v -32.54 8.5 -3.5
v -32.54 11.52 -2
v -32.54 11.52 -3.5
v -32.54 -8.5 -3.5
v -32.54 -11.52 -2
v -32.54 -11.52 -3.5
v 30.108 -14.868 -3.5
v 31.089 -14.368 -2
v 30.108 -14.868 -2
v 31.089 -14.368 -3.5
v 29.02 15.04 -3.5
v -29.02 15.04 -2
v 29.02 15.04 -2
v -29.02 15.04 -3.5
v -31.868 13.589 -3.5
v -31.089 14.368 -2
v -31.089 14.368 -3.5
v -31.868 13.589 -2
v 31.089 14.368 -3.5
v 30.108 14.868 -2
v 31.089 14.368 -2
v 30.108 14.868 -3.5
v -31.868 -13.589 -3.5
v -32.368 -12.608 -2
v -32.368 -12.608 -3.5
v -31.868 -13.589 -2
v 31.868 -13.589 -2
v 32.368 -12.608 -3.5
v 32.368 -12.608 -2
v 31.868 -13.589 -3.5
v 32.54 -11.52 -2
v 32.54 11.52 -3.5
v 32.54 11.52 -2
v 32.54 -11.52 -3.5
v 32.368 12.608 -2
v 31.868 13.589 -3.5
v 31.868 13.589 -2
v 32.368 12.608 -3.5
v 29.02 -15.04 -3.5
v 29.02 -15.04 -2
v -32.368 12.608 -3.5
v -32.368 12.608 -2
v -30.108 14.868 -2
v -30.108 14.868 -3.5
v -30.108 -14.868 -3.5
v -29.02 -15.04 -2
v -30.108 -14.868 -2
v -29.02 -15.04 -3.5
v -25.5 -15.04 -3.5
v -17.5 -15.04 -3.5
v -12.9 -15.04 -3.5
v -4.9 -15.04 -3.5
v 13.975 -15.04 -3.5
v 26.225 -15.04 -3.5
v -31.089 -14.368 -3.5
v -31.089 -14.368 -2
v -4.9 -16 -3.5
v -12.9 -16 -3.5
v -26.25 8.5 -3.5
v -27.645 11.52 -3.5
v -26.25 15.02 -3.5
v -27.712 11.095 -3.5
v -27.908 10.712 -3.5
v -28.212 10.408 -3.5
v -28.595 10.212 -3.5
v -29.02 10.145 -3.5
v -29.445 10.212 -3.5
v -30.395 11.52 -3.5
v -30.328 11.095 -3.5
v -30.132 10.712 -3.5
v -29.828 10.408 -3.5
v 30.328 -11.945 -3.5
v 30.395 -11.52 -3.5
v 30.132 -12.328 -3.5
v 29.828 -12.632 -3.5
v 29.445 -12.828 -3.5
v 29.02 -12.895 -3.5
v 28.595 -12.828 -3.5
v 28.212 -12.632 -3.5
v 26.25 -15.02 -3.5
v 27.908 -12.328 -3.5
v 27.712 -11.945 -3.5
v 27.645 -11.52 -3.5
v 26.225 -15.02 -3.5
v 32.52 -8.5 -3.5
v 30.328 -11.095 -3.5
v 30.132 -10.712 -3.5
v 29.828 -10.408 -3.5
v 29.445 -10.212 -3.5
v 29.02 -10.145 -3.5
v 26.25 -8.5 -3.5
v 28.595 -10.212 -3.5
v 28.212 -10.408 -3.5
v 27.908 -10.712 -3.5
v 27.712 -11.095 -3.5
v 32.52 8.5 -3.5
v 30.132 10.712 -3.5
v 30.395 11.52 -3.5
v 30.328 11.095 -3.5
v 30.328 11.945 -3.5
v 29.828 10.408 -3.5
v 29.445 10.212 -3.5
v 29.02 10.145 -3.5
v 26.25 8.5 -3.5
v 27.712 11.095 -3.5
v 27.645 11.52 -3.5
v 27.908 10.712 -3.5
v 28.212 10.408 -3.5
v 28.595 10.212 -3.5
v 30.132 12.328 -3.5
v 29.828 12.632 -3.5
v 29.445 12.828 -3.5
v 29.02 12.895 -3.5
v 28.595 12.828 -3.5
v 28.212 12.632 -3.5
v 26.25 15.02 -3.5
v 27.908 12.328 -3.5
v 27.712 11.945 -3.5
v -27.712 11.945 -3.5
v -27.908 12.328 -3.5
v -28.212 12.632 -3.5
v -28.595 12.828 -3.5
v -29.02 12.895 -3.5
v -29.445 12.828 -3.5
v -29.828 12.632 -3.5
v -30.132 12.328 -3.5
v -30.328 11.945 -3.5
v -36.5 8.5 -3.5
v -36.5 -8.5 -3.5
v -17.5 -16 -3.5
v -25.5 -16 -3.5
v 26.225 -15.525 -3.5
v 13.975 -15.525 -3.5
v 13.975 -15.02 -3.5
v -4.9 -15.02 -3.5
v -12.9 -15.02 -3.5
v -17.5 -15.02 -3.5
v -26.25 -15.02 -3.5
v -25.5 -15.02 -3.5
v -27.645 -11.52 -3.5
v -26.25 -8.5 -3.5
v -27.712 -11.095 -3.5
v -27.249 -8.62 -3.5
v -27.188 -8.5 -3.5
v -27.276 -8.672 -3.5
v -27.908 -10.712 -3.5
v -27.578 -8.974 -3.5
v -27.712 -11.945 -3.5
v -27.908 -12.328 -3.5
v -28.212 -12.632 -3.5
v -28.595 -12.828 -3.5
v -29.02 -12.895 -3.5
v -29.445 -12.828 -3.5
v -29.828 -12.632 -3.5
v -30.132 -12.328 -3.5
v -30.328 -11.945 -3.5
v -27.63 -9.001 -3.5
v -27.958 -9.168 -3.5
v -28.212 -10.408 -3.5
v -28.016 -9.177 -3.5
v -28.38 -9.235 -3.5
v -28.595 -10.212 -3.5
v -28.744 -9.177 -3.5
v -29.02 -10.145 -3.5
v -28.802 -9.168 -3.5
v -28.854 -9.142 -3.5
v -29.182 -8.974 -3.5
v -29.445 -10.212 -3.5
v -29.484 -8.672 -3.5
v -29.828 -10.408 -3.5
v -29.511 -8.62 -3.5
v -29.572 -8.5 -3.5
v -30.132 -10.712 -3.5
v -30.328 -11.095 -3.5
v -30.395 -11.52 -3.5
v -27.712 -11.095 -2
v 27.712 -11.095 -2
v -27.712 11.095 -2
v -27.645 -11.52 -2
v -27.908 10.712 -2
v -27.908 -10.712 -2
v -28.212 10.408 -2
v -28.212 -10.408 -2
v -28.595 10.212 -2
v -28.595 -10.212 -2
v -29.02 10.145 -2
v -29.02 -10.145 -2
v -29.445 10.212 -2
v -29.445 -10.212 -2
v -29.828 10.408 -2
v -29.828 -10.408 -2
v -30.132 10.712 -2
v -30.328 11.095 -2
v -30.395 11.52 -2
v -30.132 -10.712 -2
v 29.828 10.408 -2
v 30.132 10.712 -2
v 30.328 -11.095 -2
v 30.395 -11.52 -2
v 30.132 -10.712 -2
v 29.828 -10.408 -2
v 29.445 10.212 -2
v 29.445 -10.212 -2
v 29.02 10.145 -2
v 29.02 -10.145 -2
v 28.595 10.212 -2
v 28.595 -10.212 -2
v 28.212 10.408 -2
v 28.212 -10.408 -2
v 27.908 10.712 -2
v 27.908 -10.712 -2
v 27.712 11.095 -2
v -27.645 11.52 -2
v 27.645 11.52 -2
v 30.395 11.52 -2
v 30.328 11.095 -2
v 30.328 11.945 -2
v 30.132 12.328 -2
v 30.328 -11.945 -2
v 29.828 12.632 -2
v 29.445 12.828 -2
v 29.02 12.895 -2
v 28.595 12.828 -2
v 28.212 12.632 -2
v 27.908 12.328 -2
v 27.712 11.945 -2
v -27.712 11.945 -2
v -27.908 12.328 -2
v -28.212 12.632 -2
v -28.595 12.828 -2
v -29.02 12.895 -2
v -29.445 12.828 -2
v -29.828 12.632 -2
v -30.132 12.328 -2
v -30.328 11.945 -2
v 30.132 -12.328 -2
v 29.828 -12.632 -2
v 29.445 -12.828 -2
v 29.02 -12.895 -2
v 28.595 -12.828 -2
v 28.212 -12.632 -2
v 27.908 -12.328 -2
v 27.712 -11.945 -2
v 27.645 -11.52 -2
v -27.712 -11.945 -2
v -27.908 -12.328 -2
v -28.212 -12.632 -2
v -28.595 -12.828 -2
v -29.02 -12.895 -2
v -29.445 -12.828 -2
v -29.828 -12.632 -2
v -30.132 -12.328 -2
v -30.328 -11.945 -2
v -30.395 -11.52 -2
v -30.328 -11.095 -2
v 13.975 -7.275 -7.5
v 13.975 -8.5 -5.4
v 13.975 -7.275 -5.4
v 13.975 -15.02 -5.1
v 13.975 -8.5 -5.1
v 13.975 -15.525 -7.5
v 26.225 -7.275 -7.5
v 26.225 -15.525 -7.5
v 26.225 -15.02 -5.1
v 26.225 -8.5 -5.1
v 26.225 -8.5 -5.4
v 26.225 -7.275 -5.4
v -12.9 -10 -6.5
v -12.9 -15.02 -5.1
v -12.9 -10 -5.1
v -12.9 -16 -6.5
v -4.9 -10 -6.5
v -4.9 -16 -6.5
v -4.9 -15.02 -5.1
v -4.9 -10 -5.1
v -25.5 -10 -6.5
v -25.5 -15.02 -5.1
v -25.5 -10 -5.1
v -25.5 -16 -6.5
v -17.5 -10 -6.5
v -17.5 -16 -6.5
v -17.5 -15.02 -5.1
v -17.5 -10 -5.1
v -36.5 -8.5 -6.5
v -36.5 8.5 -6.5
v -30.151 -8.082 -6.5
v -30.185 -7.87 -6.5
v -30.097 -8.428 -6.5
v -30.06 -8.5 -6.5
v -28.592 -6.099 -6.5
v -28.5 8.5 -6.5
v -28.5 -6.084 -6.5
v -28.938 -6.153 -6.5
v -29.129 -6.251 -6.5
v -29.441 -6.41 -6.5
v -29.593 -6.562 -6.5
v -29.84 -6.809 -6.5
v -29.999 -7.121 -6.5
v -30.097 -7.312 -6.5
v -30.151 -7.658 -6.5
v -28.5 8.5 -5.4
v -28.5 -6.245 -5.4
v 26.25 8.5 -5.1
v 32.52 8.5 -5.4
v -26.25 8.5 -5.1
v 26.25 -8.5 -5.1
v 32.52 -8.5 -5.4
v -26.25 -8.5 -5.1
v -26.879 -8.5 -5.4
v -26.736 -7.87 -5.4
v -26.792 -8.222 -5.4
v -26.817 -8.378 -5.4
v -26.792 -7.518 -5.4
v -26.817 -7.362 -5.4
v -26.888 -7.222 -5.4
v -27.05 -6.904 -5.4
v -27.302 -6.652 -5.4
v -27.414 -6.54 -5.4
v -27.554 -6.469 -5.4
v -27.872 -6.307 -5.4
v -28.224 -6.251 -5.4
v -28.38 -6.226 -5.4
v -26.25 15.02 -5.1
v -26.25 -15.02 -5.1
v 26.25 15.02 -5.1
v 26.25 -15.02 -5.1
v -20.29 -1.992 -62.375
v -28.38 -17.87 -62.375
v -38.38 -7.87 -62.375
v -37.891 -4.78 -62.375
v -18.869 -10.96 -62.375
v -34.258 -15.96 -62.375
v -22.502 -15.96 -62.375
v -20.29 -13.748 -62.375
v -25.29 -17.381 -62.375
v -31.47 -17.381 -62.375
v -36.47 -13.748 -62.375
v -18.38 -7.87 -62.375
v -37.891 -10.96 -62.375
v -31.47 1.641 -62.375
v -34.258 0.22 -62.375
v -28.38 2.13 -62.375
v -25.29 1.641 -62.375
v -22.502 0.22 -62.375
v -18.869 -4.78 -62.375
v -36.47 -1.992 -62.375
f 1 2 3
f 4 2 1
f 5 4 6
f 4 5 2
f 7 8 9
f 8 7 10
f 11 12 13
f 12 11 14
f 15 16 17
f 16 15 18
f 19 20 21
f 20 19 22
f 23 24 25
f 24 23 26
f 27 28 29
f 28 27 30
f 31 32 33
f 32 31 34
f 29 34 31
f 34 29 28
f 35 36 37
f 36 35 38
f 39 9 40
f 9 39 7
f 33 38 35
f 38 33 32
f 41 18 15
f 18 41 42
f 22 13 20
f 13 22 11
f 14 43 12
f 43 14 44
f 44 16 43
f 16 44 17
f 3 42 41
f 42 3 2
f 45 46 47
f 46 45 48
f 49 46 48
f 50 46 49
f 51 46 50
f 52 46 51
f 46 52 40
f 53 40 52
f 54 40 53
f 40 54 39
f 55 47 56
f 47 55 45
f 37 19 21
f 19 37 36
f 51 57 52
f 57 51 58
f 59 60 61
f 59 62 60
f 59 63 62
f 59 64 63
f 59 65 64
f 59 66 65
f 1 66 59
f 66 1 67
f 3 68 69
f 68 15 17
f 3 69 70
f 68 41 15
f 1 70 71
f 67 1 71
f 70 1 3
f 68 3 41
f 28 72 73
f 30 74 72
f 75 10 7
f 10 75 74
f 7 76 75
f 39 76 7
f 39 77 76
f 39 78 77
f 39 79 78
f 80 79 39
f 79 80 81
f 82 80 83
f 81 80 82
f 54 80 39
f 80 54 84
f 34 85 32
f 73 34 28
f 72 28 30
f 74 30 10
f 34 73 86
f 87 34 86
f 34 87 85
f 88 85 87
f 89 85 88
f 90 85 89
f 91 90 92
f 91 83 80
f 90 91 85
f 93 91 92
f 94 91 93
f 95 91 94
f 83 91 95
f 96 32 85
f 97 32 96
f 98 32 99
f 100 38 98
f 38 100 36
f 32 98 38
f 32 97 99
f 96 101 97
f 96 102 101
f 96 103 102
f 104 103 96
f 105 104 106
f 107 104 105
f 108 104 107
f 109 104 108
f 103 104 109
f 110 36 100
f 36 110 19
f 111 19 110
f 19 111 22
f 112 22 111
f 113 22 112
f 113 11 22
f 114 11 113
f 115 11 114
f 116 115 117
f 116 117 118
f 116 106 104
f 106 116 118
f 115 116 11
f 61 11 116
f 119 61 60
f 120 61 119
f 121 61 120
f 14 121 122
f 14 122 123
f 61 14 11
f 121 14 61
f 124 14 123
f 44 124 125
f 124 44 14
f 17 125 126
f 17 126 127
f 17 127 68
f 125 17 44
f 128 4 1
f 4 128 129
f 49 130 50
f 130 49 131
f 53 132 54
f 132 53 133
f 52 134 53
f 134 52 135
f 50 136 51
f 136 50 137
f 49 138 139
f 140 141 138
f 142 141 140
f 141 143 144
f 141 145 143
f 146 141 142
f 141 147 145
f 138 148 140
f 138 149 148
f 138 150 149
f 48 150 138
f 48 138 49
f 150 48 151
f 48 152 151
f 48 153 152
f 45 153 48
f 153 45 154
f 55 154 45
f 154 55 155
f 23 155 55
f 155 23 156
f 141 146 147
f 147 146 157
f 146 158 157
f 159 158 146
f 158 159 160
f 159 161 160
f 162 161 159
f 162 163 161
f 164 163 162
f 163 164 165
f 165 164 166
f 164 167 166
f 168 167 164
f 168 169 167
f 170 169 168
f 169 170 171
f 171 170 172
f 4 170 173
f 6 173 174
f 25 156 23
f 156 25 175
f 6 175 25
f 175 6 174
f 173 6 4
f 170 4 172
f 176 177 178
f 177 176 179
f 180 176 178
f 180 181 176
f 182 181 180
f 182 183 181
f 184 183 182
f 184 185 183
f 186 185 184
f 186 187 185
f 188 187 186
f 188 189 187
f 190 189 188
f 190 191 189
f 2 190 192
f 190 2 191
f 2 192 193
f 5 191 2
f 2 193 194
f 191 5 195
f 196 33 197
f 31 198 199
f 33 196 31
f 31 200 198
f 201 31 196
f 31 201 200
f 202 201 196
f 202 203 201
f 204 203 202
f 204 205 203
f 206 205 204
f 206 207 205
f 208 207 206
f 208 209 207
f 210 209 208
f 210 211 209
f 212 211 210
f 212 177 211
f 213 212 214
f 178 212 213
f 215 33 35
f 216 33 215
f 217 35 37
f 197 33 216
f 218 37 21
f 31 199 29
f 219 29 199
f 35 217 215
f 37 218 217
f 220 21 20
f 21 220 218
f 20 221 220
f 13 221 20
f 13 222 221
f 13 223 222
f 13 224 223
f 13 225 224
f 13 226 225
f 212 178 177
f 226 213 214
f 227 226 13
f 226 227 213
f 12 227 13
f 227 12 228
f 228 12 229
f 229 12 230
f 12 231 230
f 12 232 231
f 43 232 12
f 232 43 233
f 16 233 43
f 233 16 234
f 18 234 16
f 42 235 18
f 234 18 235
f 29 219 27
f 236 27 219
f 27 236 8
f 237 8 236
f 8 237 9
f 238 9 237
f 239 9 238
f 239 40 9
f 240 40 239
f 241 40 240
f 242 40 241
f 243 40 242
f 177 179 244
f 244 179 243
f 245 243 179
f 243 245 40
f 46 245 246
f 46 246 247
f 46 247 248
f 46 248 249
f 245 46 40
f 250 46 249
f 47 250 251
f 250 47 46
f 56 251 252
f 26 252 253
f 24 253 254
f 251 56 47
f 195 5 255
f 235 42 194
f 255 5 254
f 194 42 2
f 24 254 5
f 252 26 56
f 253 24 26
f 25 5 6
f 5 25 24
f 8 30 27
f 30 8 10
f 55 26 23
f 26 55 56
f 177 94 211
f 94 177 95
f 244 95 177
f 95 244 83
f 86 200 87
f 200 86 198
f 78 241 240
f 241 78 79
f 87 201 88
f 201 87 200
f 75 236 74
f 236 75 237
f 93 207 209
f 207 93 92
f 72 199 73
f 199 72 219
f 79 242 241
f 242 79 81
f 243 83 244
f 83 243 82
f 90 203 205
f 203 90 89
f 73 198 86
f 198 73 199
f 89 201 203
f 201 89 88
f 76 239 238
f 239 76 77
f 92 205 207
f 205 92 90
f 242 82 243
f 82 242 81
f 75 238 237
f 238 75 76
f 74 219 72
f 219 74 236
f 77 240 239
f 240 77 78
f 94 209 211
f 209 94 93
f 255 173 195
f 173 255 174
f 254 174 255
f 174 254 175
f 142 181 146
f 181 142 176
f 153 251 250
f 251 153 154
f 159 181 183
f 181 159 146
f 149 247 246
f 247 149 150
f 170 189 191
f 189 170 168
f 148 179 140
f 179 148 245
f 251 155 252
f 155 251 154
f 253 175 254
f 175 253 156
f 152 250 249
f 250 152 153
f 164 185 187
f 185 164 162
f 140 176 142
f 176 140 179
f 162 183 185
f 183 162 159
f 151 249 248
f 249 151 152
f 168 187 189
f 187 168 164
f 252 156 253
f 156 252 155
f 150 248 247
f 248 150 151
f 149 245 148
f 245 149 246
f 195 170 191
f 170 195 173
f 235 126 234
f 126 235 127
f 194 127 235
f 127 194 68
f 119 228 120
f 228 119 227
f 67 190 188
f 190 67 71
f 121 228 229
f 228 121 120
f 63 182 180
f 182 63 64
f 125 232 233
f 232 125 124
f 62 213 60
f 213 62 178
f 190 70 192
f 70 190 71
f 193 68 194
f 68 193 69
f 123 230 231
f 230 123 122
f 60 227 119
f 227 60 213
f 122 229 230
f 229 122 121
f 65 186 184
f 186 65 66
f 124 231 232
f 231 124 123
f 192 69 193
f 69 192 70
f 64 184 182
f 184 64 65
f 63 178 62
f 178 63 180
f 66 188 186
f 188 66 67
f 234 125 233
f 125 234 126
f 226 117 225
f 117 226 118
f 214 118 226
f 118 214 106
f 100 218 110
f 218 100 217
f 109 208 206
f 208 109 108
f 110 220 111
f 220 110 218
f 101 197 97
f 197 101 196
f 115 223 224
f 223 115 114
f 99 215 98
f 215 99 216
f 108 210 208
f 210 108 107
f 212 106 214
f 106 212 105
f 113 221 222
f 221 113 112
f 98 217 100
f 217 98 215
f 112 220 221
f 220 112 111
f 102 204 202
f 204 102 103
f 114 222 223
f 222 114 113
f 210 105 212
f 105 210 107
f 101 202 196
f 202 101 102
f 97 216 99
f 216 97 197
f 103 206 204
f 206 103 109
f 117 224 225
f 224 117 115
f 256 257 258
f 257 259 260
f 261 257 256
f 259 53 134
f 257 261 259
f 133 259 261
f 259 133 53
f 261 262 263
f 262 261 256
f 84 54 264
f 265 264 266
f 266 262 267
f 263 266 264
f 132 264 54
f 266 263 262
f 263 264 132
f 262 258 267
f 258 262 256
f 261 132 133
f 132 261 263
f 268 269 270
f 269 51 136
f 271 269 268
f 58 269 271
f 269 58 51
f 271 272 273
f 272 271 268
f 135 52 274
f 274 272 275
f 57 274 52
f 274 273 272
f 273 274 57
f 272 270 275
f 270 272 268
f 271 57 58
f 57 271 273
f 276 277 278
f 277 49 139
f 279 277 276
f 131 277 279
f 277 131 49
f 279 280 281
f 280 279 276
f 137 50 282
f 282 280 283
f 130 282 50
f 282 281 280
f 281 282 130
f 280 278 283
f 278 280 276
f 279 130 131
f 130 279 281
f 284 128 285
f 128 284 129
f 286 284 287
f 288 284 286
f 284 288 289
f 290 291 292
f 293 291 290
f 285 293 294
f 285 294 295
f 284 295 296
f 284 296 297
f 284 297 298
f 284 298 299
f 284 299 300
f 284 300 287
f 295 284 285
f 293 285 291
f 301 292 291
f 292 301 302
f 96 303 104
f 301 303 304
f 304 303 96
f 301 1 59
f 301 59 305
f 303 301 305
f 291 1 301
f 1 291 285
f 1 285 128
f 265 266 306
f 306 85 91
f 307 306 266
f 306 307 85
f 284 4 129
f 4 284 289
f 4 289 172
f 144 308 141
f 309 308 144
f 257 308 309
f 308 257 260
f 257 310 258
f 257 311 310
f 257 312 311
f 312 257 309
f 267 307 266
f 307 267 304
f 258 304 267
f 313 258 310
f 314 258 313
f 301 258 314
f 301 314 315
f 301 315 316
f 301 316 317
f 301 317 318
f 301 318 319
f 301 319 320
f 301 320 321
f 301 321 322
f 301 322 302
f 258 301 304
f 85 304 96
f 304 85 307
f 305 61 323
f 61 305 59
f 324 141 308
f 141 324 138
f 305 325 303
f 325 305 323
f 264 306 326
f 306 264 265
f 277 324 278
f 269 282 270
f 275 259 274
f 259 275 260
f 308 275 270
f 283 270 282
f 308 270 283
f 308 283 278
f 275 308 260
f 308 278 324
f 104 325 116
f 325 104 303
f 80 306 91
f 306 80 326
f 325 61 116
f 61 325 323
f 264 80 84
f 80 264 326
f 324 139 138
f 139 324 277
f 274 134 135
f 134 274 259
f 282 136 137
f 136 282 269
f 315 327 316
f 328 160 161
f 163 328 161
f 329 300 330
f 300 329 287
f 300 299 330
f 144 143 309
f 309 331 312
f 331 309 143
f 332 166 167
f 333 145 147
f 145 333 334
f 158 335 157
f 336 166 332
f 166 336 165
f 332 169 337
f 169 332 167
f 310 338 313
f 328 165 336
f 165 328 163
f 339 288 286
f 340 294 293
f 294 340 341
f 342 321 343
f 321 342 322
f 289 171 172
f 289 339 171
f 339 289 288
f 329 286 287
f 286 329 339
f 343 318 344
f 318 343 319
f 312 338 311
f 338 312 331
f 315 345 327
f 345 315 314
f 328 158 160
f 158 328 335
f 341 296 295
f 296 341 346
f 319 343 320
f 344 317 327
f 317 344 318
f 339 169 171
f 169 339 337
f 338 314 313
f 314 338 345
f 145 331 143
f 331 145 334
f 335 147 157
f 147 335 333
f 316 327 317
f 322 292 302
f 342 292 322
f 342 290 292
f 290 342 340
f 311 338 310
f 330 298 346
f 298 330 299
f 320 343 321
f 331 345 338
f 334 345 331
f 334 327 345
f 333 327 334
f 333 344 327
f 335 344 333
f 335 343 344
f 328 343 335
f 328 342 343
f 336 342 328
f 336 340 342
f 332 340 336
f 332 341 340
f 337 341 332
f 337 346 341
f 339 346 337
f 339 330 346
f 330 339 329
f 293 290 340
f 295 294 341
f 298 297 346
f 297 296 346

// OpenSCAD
//  Pi Zero model for checking other models
//  0,0,0 is centre of PCB, bottom face
//  This model is for V1.2

// PCB size variables
PiSizeX = 65.04;
PiSizeY = 30.04;
PiSizeZ = 1.5;
PiCornerRad = 3.52;
PiHoleEdge = 3.5;       // Mount holes are 3.5mm from each edge
PiHoleDia = 2.75;
PiHoleRad = PiHoleDia / 2;
PiHoleClearRad = 3.0;    // Mount holes have 6 Dia clear on PCB

//  Component connector centrelines from Pi centreline
PiSDX = -24.5;          // SD holder
PiSDY = 1.9;
PiUSBX = 8.9;           // Data (USB)
PiUSBY = -13;
PiOTGX = 21.5;          // Power (OTG)
PiOTGY = -13;
PiHDMIX = -20.1;        // HDMI
PiHDMIY = -11.4;
PiLEDX = 28.38;         // LED
PiLEDY = -7.87;
PiCAMX = 32.5;   //Camera connector
PiCAMY = 0;


//  Component connector sizes
PiSDsizeX = 11.5;
PiSDsizeY = 12.0;
PiSDsizeZ = 1.3;
PiUSBsizeX = 8;
PiUSBsizeY = 6.0;
PiUSBsizeZ = 3;
PiHDMIsizeX = 12.25;
PiHDMIsizeY = 8.25;
PiHDMIsizeZ = 4;
PiCAMsizeY = 17;
PiCAMsizeX = 8;
PiCAMsizeZ = 3;


// Keepout sizes
PiKOLengthX = PiSizeX;
PiKOLengthY = 17;
PiKOLengthZ = 1.9;
PiKOWidthX = 52.5;
PiKOWidthY = PiSizeY;
PiKOWidthZ = 1.6;


//  SOC centrelines and sizes
PiSOCX = -2.5;
PiSOCY = -2;
PiSOCsizeX = 12;
PiSOCsizeY = 12;
PiSOCsizeZ = 1.2;


//  Mount hole dims from centre lines
PiHoleX = PiSizeX/2 - PiHoleEdge;
PiHoleY = PiSizeY/2 - PiHoleEdge;

//
// Modules used for Pi model
//
module PiDrawPad(Xpos,Ypos,Di,Col)    // Places a spot at test pad point, coloured to show pad function
{
translate([Xpos,Ypos,PiSizeZ/4])
    color(Col)
    cylinder(h=PiSizeZ*2/3,d=Di,center=true);
}

module PiPCBhole(Xpos,Ypos)   // Cuts a hole through PCB
{
translate([Xpos,Ypos,PiSizeZ/2])
    cylinder(h=2*PiSizeZ,d=PiHoleDia,center=true);
}

module PiComponent(Xpos,Ypos,Xsize,Ysize,Zsize,Col)    // Makes a block to represent a component on the upper face
{
translate([Xpos,Ypos,PiSizeZ + Zsize/2]) color(Col)
    cube([Xsize,Ysize,Zsize], center=true);
}

module PiLEDCone(Xpos,Ypos,Col)    // Places a spot at test pad point, coloured to show pad function
{
    translate([Xpos,Ypos,PiSizeZ/4]) {
        color(Col);
        cylinder(h=60,r1=1.2,r2=10,center=false);
    }
}

//
//  This is the main routine and can be called from outside
//
module PiZeroBody() // Models the Pi.
{
color("Green")
difference()
    {
    hull()  // PCB shape
        {
        translate([-PiHoleX,-PiHoleY,PiSizeZ/2])
            cylinder(r=PiCornerRad,h=PiSizeZ,center=true);
        translate([PiHoleX,-PiHoleY,PiSizeZ/2])
            cylinder(r=PiCornerRad,h=PiSizeZ,center=true);
        translate([PiHoleX,PiHoleY,PiSizeZ/2])
            cylinder(r=PiCornerRad,h=PiSizeZ,center=true);
        translate([-PiHoleX,PiHoleY,PiSizeZ/2])
            cylinder(r=PiCornerRad,h=PiSizeZ,center=true);
        }
 
    // Corner screw holes
    PiPCBhole(-PiHoleX,-PiHoleY);
    PiPCBhole(PiHoleX,-PiHoleY);
    PiPCBhole(PiHoleX,PiHoleY);
    PiPCBhole(-PiHoleX,PiHoleY);
   
    }
    
PiComponent(PiSOCX,PiSOCY,PiSOCsizeX,PiSOCsizeY,PiSOCsizeZ,"Black");   // Processor
PiComponent(PiSDX,PiSDY,PiSDsizeX,PiSOCsizeY,PiSOCsizeZ,"Silver");   // SD card
PiComponent(PiHDMIX,PiHDMIY,PiHDMIsizeX,PiHDMIsizeY,PiHDMIsizeZ,"Silver");   // HDMI
PiComponent(PiUSBX,PiUSBY,PiUSBsizeX,PiUSBsizeY,PiUSBsizeZ,"Silver");   // USB
PiComponent(PiOTGX,PiOTGY,PiUSBsizeX,PiUSBsizeY,PiUSBsizeZ,"Silver");   // Power
PiComponent(PiCAMX,PiCAMY,PiCAMsizeX,PiCAMsizeY,PiCAMsizeZ,"Silver");   // Camera
PiComponent(0,0,PiKOLengthX,PiKOLengthY,PiKOLengthZ,"Yellow");   // Keep Out
PiComponent(0,0,PiKOWidthX,PiKOWidthY,PiKOWidthZ,"Yellow");   // Keep Out
PiLEDCone(PiLEDX,PiLEDY,"Green");
}


/*
End of Pi model routines
Program from here
*/

// Input variables
ShowPiZero = true;
//ShowPiZero = false;

// Overall definition
$fn=20;


// Model the Zero if required
if(ShowPiZero) {
     rotate(a=180, v=[0,0,1]) {
        translate ([0, 0, -2]) {
            rotate(a=180, v=[1,0,0]) {
                PiZeroBody();
            }
        }
    }
}
